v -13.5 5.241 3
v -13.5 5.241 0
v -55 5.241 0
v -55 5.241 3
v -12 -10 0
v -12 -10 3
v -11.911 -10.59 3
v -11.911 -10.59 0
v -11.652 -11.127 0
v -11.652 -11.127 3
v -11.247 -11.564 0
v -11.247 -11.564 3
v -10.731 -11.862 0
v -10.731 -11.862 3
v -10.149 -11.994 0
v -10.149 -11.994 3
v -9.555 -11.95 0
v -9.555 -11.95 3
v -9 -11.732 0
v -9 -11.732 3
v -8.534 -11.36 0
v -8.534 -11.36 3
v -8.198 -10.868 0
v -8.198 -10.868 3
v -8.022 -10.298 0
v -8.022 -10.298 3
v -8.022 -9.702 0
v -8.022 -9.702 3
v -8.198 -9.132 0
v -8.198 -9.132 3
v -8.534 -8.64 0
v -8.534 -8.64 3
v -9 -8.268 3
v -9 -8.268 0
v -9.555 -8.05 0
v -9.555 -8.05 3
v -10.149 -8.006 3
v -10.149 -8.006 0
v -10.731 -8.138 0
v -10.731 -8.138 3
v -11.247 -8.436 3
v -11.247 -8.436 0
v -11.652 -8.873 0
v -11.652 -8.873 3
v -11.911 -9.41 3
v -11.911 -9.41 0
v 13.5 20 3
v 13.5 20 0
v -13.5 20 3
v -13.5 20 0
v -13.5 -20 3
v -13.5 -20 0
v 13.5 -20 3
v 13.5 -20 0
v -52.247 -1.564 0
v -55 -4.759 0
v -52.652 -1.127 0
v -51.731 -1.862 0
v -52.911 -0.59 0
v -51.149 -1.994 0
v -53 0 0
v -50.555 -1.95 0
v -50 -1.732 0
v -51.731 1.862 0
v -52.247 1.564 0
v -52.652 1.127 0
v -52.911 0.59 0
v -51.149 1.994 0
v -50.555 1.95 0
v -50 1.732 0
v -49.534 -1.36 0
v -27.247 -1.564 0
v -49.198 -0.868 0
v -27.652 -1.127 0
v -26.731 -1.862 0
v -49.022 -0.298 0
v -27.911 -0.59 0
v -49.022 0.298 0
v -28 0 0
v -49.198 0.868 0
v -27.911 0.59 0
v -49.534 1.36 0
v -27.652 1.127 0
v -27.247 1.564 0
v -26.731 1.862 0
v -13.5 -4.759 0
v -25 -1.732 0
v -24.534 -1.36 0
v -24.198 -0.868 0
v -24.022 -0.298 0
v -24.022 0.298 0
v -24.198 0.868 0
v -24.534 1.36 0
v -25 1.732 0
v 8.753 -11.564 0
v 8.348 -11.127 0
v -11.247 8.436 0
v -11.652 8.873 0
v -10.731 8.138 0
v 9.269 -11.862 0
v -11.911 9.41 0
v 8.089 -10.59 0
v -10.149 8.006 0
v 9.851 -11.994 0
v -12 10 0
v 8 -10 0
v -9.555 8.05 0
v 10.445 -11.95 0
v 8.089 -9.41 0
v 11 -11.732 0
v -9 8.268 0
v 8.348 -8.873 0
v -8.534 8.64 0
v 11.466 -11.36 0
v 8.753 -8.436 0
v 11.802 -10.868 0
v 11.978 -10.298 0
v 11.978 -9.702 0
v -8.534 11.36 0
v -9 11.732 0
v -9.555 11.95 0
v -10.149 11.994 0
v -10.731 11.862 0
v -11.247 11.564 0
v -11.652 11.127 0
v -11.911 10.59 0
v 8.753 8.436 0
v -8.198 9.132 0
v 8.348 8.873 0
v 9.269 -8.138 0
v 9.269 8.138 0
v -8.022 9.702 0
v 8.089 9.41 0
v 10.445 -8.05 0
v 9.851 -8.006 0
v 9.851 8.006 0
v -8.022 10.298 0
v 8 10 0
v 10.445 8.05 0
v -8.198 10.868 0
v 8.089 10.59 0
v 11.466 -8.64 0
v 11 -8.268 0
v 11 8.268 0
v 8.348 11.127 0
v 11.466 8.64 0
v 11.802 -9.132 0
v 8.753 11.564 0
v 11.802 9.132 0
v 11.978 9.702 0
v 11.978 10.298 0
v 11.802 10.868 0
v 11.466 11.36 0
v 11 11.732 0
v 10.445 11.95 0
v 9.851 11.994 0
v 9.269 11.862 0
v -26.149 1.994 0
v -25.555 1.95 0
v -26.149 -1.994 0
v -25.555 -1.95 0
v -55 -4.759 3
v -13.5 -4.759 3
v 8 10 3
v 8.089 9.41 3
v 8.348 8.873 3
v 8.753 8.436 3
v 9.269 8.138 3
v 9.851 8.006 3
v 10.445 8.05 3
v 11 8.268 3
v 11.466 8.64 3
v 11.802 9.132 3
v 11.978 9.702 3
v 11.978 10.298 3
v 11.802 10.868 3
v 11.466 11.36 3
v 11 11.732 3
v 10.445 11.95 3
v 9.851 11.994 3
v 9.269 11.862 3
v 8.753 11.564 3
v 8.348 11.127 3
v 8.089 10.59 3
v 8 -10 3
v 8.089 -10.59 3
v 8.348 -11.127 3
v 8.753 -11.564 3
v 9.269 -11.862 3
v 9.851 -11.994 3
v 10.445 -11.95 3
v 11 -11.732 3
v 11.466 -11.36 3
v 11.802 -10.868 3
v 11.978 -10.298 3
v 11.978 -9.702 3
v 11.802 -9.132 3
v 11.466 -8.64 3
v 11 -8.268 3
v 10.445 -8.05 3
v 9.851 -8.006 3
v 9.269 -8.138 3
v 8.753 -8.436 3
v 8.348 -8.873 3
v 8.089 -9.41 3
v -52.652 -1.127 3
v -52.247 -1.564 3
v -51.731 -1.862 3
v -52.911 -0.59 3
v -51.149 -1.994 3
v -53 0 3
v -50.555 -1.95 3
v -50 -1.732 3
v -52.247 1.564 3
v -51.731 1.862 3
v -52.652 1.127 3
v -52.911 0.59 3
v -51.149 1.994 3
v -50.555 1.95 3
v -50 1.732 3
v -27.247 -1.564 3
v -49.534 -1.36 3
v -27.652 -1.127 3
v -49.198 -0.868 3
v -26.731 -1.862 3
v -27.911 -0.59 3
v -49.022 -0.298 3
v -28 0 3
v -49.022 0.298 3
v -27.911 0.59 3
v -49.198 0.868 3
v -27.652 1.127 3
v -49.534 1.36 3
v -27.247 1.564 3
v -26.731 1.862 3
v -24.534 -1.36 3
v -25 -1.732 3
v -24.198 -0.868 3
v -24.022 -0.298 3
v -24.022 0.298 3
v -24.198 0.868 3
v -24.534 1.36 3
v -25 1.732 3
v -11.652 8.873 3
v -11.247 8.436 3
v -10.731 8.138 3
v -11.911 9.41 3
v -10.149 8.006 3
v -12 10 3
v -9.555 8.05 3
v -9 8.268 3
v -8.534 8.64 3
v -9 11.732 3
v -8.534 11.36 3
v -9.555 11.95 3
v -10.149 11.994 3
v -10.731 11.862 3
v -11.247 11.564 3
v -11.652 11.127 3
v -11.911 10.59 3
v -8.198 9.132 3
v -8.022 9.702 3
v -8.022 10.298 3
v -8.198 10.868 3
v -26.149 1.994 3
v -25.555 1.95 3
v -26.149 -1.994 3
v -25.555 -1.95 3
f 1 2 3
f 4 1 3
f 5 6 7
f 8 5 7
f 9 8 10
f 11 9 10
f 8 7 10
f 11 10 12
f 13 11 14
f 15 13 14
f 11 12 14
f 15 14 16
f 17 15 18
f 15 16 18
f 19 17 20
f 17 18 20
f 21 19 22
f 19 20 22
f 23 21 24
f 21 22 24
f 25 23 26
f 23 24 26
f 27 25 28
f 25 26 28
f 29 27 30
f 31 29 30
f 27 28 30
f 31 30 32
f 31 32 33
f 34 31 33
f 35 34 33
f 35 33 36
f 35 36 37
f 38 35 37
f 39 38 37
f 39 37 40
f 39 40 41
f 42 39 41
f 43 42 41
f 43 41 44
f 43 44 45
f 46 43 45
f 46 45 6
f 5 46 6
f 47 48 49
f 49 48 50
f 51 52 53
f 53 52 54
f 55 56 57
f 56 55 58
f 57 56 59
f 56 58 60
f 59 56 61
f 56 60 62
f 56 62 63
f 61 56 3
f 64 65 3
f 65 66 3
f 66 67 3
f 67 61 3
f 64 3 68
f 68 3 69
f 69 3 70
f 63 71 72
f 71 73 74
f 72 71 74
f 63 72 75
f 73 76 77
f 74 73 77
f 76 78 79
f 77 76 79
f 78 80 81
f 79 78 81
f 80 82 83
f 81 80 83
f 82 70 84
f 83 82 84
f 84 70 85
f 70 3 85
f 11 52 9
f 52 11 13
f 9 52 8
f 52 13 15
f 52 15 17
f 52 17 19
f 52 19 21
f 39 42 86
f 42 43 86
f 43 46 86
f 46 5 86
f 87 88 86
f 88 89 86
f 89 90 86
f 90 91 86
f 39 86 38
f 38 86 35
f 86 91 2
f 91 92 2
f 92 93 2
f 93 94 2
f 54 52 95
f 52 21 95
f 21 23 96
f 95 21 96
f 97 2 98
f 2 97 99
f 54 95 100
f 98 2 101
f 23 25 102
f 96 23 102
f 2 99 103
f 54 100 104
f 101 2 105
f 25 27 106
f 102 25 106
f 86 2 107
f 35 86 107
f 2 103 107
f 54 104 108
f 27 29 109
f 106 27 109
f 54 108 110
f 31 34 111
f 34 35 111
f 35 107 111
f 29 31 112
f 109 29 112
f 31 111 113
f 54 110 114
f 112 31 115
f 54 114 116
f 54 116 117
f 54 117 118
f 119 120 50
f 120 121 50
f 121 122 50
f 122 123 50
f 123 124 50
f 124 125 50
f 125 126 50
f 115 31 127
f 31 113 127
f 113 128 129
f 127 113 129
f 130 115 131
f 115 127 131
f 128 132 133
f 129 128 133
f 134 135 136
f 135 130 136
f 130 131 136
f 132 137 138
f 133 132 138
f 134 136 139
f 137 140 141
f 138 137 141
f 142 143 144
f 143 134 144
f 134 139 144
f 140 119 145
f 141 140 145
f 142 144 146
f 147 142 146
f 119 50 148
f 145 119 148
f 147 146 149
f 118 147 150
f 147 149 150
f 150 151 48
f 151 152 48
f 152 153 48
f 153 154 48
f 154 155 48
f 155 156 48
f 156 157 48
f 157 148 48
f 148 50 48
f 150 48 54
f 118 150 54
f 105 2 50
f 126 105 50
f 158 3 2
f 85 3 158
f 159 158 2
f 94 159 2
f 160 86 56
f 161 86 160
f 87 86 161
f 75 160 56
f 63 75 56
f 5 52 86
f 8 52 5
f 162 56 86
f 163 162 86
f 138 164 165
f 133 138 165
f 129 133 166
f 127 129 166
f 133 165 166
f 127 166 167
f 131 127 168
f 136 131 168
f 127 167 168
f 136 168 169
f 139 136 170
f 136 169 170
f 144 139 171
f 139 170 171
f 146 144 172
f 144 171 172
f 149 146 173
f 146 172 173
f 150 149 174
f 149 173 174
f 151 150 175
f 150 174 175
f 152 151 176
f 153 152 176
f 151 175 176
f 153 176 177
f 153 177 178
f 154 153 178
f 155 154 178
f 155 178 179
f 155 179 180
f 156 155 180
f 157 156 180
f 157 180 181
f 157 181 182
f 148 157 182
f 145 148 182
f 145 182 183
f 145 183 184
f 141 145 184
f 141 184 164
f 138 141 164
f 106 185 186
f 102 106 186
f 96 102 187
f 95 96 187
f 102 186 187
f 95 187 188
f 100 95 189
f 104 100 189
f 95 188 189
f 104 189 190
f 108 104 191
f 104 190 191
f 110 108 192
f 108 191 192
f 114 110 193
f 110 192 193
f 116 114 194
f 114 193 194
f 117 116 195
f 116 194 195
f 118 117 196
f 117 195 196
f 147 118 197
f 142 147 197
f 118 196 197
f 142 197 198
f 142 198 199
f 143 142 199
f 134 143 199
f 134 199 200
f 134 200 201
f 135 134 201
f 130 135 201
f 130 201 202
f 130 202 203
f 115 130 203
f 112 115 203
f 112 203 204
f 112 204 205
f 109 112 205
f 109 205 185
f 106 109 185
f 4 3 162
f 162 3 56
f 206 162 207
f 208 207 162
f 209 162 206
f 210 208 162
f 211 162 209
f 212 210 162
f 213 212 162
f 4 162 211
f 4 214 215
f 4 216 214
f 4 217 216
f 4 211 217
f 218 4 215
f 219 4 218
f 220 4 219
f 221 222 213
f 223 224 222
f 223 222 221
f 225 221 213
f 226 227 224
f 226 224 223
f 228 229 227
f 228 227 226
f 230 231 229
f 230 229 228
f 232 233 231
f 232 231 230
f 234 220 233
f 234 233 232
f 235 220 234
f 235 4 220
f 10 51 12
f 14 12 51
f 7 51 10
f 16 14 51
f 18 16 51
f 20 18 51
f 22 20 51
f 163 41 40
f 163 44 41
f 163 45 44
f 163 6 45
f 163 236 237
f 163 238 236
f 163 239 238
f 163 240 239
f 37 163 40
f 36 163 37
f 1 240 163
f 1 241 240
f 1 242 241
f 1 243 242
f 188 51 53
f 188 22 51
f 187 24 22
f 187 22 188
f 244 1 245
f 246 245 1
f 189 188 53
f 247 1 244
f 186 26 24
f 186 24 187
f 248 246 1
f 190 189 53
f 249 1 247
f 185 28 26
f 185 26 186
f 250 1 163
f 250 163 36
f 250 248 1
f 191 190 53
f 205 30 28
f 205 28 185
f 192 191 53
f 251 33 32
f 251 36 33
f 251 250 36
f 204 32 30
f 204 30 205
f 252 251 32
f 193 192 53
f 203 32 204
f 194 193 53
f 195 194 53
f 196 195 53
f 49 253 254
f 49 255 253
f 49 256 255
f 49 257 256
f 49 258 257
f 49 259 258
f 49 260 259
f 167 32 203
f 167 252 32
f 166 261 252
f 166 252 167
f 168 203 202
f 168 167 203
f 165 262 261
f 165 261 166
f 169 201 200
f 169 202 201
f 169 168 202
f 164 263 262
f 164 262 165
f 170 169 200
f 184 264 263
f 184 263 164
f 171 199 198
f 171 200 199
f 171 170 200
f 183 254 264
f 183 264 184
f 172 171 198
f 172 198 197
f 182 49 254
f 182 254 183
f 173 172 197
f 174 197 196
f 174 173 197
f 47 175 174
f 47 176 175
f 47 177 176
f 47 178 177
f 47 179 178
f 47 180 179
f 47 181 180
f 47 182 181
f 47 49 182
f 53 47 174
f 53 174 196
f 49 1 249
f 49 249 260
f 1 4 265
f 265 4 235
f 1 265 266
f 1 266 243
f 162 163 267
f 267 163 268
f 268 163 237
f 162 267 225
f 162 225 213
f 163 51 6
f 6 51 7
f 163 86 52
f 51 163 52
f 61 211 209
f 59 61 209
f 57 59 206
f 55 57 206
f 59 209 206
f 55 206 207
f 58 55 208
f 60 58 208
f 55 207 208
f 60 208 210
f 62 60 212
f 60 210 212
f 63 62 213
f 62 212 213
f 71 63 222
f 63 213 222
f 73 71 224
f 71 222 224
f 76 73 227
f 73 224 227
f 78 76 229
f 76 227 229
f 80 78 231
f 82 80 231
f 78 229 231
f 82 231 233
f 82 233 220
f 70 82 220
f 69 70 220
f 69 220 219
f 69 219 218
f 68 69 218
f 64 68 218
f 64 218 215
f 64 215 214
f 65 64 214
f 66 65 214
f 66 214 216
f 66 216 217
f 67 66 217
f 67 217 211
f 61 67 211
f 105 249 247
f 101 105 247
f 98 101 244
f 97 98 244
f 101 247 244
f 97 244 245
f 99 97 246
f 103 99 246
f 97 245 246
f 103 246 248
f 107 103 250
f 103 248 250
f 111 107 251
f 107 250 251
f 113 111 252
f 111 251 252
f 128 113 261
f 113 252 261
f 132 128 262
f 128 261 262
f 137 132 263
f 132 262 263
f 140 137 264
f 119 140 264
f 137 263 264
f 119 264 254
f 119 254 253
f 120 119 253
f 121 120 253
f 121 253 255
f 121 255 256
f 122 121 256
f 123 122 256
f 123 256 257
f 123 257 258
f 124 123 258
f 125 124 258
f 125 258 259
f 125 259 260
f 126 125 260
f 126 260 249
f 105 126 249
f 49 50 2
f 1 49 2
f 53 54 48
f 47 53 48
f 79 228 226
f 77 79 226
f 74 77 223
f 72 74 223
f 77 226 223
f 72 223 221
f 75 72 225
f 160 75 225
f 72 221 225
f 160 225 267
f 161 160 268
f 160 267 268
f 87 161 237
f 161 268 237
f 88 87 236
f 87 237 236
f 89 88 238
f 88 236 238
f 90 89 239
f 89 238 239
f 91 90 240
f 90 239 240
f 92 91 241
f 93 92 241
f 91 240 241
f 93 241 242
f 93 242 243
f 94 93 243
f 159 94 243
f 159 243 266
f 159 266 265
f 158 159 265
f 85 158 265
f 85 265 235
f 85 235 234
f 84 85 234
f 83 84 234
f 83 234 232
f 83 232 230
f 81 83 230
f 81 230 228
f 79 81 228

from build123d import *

# Parameters (mm, degrees)
F1_DEPTH = 3
F2_D     = 4


with BuildPart() as f1:
    # F0 (on Top) → F1 (new body)
    with BuildSketch(Plane.XY):
        Polygon((-13.5, -20), (13.5, -20), (13.5, 20), (-13.5, 20), (-13.5, 5.2414399013), (-55, 5.2414399013), (-55, -4.7585600987), (-13.5, -4.7585600987), align=None)
    extrude(amount=F1_DEPTH)

    # F2 (through all)
    with Locations(Plane(origin=(0, 0, 0), x_dir=(1, 0, 0), z_dir=(0, 0, -1))):
        with Locations((-51, 0), (-26, 0), (-10, 10), (10, -10), (10, 10), (-10, -10)):
            Hole(F2_D / 2)


solid = f1.part
